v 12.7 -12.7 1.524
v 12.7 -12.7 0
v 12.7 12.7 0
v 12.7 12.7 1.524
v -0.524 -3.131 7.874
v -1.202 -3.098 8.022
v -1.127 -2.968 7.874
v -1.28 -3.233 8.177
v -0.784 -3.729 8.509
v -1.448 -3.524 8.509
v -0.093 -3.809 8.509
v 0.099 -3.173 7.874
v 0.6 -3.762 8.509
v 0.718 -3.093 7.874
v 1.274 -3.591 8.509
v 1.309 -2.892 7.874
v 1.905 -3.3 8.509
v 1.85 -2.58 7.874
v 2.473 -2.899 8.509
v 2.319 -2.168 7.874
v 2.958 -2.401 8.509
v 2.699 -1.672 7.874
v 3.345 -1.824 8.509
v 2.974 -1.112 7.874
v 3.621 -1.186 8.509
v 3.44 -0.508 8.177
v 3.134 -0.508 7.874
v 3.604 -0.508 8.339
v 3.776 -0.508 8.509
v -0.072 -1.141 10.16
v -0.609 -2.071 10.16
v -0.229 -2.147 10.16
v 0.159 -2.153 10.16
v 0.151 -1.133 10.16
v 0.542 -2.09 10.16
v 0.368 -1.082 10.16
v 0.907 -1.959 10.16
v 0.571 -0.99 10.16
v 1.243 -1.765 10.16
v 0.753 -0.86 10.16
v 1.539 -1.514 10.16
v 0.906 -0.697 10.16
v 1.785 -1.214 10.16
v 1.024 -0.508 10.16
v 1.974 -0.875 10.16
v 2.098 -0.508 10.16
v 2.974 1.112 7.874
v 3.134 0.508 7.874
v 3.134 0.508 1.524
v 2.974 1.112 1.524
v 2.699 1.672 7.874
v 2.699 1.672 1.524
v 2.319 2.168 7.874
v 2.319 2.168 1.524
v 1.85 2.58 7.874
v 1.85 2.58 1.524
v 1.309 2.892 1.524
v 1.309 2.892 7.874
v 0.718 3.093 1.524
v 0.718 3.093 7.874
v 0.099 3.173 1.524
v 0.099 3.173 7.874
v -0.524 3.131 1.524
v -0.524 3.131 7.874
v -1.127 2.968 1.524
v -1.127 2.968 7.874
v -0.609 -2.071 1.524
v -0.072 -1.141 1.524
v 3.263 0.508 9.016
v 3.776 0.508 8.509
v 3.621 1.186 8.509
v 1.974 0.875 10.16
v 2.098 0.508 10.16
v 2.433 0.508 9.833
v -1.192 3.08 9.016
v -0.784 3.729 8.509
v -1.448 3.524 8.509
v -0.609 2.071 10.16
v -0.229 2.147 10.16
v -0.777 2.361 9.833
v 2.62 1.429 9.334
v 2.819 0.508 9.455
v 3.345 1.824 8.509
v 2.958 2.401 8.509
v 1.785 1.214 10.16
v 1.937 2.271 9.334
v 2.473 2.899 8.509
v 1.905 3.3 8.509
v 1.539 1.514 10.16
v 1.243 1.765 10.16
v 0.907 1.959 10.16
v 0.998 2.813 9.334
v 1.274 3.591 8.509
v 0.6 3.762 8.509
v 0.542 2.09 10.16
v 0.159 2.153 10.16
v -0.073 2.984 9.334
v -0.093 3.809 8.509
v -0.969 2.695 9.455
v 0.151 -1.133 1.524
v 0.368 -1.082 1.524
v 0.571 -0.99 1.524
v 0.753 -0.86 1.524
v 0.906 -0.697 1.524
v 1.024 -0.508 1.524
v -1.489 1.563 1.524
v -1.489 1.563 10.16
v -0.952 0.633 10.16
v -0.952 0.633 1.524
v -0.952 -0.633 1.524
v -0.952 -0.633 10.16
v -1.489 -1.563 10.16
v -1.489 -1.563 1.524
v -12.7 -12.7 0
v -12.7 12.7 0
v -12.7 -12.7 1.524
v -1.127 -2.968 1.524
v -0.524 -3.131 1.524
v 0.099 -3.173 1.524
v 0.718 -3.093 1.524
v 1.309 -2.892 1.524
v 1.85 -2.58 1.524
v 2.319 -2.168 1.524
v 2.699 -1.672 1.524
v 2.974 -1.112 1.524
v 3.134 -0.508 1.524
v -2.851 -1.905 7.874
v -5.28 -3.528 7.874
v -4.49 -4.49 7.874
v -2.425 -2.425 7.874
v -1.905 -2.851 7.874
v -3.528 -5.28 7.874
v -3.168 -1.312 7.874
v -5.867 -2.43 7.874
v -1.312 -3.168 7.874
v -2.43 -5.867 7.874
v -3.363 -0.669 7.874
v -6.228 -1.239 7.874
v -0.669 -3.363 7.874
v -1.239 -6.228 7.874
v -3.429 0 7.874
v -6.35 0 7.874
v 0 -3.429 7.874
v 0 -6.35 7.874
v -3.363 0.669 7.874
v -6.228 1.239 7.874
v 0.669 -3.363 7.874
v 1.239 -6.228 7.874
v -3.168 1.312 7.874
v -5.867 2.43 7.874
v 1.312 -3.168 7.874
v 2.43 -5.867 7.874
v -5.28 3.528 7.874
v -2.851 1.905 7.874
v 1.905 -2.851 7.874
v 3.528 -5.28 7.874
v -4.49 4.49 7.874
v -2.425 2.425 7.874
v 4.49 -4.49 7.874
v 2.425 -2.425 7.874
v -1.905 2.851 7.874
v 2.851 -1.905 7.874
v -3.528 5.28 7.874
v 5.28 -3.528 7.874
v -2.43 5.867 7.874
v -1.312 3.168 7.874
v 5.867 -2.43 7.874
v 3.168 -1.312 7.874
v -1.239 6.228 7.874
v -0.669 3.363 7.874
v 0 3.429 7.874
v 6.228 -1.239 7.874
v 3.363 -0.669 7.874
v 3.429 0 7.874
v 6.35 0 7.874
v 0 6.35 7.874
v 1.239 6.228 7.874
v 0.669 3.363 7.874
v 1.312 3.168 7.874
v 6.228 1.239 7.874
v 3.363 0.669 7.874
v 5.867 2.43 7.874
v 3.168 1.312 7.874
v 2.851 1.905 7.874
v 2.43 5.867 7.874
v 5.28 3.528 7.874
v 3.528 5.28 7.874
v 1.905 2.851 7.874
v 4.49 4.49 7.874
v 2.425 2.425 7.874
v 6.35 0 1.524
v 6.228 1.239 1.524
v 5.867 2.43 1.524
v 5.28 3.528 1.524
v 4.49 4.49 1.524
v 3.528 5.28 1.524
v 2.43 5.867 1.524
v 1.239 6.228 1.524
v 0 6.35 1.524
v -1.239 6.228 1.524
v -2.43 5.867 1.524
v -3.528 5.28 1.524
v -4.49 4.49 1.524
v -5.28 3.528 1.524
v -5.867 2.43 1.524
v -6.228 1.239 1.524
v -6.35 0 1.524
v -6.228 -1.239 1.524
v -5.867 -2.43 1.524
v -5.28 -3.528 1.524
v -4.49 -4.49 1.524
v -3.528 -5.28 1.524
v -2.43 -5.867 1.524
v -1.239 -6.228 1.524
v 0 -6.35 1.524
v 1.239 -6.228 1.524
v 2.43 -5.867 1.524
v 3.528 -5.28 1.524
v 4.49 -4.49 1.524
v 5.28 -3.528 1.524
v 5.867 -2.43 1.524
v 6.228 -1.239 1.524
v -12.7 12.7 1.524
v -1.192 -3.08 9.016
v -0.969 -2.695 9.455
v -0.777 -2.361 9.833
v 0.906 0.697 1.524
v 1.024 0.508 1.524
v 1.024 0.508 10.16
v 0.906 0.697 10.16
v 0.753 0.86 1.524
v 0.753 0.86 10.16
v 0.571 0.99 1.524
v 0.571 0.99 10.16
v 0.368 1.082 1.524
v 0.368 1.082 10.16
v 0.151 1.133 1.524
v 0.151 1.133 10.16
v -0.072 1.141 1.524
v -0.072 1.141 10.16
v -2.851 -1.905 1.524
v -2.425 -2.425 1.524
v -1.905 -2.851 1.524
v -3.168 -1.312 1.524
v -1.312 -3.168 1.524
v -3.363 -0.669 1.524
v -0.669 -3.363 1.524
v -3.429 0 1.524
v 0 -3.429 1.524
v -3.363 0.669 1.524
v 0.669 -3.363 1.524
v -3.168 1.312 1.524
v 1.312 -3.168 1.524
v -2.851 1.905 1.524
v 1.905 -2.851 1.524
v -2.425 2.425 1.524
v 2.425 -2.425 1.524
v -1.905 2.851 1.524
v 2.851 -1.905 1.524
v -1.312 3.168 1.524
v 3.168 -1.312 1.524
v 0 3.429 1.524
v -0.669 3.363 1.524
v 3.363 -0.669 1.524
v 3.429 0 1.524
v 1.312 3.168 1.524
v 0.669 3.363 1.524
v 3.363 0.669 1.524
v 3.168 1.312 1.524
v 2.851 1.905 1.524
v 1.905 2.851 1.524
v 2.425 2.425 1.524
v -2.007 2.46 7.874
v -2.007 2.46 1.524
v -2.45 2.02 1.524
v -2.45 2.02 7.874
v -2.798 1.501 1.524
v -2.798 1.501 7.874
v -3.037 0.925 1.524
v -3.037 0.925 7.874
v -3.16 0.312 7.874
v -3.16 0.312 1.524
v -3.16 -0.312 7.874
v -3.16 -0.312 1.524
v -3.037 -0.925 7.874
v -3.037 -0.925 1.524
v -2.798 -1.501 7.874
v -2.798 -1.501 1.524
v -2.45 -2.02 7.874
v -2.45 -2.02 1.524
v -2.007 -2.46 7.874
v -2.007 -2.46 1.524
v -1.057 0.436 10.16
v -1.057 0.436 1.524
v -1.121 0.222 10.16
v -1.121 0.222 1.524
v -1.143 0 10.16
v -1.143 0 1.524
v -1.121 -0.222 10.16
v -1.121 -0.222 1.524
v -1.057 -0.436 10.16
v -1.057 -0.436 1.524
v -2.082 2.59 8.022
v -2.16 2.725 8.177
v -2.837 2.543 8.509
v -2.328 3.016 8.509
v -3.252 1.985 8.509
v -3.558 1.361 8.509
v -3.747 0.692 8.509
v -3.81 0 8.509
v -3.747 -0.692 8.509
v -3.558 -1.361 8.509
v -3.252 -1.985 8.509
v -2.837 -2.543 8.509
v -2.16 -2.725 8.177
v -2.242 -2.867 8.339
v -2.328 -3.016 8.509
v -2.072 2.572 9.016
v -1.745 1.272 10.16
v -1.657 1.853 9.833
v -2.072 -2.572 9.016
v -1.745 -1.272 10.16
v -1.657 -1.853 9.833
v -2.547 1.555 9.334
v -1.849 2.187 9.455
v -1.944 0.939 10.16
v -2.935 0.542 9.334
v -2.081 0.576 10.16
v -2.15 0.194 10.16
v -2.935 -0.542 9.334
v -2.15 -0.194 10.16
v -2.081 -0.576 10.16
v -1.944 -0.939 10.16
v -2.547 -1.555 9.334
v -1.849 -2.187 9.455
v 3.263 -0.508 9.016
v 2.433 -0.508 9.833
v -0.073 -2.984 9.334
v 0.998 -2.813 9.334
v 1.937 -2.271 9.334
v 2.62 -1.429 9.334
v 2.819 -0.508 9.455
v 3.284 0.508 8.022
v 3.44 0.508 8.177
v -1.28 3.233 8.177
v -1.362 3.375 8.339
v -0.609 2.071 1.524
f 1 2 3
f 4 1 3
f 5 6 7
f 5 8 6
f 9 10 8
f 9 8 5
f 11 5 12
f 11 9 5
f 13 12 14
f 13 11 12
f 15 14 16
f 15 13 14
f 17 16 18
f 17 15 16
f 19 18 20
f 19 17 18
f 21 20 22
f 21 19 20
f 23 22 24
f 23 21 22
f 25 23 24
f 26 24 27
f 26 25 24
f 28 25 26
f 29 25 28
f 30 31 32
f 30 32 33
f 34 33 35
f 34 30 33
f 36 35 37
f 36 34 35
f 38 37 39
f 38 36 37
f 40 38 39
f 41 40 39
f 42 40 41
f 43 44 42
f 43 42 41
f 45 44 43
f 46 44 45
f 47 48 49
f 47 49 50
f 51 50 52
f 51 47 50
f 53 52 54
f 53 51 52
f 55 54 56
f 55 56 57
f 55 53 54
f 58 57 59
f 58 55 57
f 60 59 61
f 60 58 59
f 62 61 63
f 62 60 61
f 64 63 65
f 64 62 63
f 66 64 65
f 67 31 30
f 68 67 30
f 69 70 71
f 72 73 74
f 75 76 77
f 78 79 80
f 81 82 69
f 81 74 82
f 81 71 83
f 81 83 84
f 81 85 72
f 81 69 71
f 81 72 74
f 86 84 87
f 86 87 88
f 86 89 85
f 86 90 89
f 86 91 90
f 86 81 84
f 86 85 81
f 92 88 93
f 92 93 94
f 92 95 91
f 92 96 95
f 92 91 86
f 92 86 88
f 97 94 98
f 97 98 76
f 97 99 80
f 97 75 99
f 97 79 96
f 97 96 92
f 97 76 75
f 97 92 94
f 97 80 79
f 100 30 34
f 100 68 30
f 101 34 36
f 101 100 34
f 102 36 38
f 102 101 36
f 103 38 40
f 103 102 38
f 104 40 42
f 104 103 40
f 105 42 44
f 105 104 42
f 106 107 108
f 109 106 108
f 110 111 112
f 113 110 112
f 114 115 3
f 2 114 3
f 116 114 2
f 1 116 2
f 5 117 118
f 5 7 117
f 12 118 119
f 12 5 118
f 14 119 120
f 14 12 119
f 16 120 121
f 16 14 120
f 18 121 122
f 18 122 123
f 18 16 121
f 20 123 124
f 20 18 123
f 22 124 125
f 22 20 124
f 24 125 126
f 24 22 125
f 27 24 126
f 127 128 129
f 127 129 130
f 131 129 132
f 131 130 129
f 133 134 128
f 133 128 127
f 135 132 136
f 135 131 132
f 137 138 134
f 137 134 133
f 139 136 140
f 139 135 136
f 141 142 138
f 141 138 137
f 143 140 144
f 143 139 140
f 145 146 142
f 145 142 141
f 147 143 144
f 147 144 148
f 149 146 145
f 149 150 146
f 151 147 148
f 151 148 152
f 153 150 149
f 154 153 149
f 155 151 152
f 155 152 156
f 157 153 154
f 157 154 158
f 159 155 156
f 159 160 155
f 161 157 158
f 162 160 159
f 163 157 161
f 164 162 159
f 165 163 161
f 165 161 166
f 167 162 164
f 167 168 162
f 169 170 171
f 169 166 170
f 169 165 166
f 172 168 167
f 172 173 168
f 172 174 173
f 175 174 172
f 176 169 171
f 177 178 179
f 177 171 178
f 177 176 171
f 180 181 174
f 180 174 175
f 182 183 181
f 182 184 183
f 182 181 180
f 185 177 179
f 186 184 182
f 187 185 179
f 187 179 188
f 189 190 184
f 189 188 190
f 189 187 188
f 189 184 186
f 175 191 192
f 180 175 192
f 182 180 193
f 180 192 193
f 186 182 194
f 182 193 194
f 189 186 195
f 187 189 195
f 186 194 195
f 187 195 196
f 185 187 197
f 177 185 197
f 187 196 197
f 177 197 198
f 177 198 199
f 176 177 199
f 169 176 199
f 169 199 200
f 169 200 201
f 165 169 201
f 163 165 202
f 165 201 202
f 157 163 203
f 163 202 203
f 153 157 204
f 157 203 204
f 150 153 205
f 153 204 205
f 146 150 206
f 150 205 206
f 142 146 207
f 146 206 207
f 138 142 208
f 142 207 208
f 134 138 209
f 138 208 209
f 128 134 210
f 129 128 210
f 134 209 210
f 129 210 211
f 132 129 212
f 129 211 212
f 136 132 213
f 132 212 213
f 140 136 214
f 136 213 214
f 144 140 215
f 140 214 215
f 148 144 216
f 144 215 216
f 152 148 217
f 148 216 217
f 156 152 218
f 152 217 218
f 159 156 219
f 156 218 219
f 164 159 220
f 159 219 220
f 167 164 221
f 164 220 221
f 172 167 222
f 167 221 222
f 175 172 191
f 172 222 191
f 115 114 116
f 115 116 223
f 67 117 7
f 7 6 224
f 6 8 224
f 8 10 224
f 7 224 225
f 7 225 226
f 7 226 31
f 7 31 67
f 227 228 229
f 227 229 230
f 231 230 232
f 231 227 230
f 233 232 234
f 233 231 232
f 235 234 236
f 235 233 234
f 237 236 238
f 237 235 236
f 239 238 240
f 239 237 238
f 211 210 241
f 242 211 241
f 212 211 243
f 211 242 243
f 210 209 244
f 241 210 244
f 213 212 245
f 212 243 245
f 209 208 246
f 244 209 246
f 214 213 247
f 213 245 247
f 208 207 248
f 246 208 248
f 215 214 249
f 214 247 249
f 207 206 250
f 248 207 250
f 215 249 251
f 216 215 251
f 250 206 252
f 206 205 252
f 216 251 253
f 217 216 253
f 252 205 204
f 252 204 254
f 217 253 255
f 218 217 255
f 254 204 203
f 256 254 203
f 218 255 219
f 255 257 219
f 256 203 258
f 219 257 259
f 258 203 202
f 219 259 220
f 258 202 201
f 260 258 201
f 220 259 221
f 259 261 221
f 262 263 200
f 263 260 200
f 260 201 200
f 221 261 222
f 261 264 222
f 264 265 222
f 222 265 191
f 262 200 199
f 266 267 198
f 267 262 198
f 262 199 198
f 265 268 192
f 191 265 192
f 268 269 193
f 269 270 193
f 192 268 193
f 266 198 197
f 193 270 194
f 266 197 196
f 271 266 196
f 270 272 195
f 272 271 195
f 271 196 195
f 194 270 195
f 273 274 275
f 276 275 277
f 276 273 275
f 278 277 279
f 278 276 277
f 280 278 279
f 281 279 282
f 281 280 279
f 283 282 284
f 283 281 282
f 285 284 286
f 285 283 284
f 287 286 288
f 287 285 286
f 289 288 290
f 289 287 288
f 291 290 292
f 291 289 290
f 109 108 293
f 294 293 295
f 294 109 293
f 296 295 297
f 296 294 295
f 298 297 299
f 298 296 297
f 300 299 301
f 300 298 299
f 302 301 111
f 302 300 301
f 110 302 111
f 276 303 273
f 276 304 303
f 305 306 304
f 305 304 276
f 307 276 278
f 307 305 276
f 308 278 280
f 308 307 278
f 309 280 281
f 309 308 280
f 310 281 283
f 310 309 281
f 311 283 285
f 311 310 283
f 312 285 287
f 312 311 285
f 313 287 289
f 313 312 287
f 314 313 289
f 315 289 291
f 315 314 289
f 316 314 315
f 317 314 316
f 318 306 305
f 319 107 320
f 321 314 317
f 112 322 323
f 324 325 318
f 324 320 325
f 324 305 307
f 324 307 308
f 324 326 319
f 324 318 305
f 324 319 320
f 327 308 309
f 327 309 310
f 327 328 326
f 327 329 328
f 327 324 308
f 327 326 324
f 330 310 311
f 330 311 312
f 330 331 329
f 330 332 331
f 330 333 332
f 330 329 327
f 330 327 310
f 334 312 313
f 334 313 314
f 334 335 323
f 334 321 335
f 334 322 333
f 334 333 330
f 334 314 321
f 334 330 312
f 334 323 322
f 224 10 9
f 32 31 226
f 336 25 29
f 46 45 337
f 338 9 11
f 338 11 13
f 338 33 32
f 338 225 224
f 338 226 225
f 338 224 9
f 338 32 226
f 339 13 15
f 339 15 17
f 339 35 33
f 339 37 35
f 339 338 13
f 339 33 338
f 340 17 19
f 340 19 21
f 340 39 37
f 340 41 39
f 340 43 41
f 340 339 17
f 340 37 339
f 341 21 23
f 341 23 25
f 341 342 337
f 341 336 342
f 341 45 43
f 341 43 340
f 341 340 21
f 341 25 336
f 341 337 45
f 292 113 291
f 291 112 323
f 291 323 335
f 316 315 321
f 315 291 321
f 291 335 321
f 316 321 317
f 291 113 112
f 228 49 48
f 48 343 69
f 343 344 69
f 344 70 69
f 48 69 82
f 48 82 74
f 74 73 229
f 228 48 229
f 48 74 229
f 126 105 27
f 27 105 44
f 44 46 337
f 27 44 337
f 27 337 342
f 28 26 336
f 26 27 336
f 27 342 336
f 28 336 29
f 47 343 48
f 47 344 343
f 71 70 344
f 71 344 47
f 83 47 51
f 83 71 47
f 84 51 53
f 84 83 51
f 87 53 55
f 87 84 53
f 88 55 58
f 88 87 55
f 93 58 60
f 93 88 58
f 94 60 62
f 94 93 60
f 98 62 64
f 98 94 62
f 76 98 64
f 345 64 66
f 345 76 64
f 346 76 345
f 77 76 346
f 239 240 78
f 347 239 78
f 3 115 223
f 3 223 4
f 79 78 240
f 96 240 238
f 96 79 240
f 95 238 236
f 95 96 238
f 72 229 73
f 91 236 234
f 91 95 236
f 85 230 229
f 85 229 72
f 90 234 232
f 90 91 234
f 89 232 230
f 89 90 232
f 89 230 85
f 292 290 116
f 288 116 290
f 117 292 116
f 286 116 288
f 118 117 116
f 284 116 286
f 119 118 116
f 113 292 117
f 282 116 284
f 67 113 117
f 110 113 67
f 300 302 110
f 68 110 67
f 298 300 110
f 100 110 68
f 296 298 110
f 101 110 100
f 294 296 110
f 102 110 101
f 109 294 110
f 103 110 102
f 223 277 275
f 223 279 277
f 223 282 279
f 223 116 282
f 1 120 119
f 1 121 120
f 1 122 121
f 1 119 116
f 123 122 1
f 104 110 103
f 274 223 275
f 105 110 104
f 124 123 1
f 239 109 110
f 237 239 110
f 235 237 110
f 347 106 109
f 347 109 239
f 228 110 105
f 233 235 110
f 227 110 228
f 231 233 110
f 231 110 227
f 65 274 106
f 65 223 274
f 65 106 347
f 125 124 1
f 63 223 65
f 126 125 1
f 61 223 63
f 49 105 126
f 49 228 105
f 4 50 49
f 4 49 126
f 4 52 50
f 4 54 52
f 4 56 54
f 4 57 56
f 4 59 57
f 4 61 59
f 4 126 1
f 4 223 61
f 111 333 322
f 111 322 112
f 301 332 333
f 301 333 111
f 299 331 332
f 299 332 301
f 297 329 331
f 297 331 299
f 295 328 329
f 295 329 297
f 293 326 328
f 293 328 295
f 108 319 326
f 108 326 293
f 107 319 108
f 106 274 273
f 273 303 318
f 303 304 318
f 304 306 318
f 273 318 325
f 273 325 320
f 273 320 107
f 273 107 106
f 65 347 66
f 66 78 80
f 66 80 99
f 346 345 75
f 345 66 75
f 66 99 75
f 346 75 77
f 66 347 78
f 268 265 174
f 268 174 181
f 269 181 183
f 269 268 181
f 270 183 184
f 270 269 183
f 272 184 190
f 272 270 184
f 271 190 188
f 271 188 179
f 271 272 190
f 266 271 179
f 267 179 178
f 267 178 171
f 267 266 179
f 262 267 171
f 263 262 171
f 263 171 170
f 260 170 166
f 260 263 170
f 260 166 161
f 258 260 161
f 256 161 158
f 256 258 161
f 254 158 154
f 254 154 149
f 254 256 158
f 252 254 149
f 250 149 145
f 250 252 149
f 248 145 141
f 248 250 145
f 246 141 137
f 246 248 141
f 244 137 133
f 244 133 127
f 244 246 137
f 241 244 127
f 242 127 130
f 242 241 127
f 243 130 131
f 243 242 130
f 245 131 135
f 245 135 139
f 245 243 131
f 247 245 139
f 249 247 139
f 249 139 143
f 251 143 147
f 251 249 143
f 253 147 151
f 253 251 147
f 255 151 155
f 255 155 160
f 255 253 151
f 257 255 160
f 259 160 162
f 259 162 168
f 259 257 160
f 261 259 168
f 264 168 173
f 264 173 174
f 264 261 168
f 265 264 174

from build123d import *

# Parameters (mm, degrees)
F0_W     = 25.4
F0_H     = 25.4
F1_DEPTH = 1.524
F5_DEPTH = 8.636
F6_R     = 6.35
F6_R_2   = 3.429
F7_DEPTH = 6.35


with BuildPart() as f1:
    # F0 (on Top) → F1 (new body)
    with BuildSketch(Plane.XY):
        Rectangle(F0_W, F0_H)
    extrude(amount=F1_DEPTH)

    # F2 (on Front) → F3 (revolve)
    with BuildSketch(Plane.XZ):
        Polygon((1.143, 10.16), (1.143, 0), (3.175, 0), (3.175, 7.874), (3.81, 8.509), (2.159, 10.16), align=None)
    revolve(axis=Axis((0, 0, 7.7160834335), (0, 0, 1)))

    # F4 (on face) → F5 (cut, through all)
    with BuildSketch(Plane.XY.offset(10.16)):
        with BuildLine():
            ThreePointArc((2.159, 0), (2.1437925358, -0.2558018049), (2.0983843785, -0.508))
            Line((2.0983843785, -0.508), (6.35, -0.508))
            Line((6.35, -0.508), (6.35, 0.508))
            Line((6.35, 0.508), (2.0983843785, 0.508))
            ThreePointArc((2.0983843785, 0.508), (2.1437925358, 0.2558018049), (2.159, 0))
        make_face()
        with BuildLine():
            ThreePointArc((1.143, 0), (1.1128284677, -0.2608865683), (1.023906734, -0.508))
            Line((1.023906734, -0.508), (2.0983843785, -0.508))
            ThreePointArc((2.0983843785, -0.508), (2.1437925358, -0.2558018049), (2.159, 0))
            ThreePointArc((2.159, 0), (2.1437925358, 0.2558018049), (2.0983843785, 0.508))
            Line((2.0983843785, 0.508), (1.023906734, 0.508))
            ThreePointArc((1.023906734, 0.508), (1.1128284677, 0.2608865683), (1.143, 0))
        make_face()
        with BuildLine():
            Line((-0.0720124619, -1.1407292428), (0.2932939367, -0.508))
            Line((0.2932939367, -0.508), (1.023906734, -0.508))
            ThreePointArc((1.023906734, -0.508), (1.1128284677, -0.2608865683), (1.143, 0))
            ThreePointArc((1.143, 0), (1.1128284677, 0.2608865683), (1.023906734, 0.508))
            Line((1.023906734, 0.508), (0.2932939367, 0.508))
            Line((0.2932939367, 0.508), (-0.0720124619, 1.1407292428))
            ThreePointArc((-0.0720124619, 1.1407292428), (-0.5715, 0.9898670365), (-0.9518942721, 0.6327292428))
            Line((-0.9518942721, 0.6327292428), (-0.5865878735, 0))
            Line((-0.5865878735, 0), (-0.9518942721, -0.6327292428))
            ThreePointArc((-0.9518942721, -0.6327292428), (-0.5715, -0.9898670365), (-0.0720124619, -1.1407292428))
        make_face()
        with BuildLine():
            Line((-0.6092512841, -2.0712541787), (-0.0720124619, -1.1407292428))
            ThreePointArc((-0.0720124619, -1.1407292428), (-0.5715, -0.9898670365), (-0.9518942721, -0.6327292428))
            Line((-0.9518942721, -0.6327292428), (-1.4891330944, -1.5632541787))
            ThreePointArc((-1.4891330944, -1.5632541787), (-1.0795, -1.8697488468), (-0.6092512841, -2.0712541787))
        make_face()
        with BuildLine():
            Line((-2.7350590949, -5.753261314), (-0.6092512841, -2.0712541787))
            ThreePointArc((-0.6092512841, -2.0712541787), (-1.0795, -1.8697488468), (-1.4891330944, -1.5632541787))
            Line((-1.4891330944, -1.5632541787), (-3.6149409051, -5.245261314))
            Line((-3.6149409051, -5.245261314), (-2.7350590949, -5.753261314))
        make_face()
        with BuildLine():
            Line((-3.6149409051, 5.245261314), (-1.4891330944, 1.5632541787))
            ThreePointArc((-1.4891330944, 1.5632541787), (-1.0795, 1.8697488468), (-0.6092512841, 2.0712541787))
            Line((-0.6092512841, 2.0712541787), (-2.7350590949, 5.753261314))
            Line((-2.7350590949, 5.753261314), (-3.6149409051, 5.245261314))
        make_face()
        with BuildLine():
            Line((-1.4891330944, 1.5632541787), (-0.9518942721, 0.6327292428))
            ThreePointArc((-0.9518942721, 0.6327292428), (-0.5715, 0.9898670365), (-0.0720124619, 1.1407292428))
            Line((-0.0720124619, 1.1407292428), (-0.6092512841, 2.0712541787))
            ThreePointArc((-0.6092512841, 2.0712541787), (-1.0795, 1.8697488468), (-1.4891330944, 1.5632541787))
        make_face()
    extrude(amount=-F5_DEPTH, mode=Mode.SUBTRACT)


with BuildPart() as f7:
    # F6 (on face) → F7 (new body)
    with BuildSketch(Plane.XY.offset(1.524)):
        Circle(F6_R)
        Circle(F6_R_2, mode=Mode.SUBTRACT)
    extrude(amount=F7_DEPTH)


solid = Compound([f1.part, f7.part])
